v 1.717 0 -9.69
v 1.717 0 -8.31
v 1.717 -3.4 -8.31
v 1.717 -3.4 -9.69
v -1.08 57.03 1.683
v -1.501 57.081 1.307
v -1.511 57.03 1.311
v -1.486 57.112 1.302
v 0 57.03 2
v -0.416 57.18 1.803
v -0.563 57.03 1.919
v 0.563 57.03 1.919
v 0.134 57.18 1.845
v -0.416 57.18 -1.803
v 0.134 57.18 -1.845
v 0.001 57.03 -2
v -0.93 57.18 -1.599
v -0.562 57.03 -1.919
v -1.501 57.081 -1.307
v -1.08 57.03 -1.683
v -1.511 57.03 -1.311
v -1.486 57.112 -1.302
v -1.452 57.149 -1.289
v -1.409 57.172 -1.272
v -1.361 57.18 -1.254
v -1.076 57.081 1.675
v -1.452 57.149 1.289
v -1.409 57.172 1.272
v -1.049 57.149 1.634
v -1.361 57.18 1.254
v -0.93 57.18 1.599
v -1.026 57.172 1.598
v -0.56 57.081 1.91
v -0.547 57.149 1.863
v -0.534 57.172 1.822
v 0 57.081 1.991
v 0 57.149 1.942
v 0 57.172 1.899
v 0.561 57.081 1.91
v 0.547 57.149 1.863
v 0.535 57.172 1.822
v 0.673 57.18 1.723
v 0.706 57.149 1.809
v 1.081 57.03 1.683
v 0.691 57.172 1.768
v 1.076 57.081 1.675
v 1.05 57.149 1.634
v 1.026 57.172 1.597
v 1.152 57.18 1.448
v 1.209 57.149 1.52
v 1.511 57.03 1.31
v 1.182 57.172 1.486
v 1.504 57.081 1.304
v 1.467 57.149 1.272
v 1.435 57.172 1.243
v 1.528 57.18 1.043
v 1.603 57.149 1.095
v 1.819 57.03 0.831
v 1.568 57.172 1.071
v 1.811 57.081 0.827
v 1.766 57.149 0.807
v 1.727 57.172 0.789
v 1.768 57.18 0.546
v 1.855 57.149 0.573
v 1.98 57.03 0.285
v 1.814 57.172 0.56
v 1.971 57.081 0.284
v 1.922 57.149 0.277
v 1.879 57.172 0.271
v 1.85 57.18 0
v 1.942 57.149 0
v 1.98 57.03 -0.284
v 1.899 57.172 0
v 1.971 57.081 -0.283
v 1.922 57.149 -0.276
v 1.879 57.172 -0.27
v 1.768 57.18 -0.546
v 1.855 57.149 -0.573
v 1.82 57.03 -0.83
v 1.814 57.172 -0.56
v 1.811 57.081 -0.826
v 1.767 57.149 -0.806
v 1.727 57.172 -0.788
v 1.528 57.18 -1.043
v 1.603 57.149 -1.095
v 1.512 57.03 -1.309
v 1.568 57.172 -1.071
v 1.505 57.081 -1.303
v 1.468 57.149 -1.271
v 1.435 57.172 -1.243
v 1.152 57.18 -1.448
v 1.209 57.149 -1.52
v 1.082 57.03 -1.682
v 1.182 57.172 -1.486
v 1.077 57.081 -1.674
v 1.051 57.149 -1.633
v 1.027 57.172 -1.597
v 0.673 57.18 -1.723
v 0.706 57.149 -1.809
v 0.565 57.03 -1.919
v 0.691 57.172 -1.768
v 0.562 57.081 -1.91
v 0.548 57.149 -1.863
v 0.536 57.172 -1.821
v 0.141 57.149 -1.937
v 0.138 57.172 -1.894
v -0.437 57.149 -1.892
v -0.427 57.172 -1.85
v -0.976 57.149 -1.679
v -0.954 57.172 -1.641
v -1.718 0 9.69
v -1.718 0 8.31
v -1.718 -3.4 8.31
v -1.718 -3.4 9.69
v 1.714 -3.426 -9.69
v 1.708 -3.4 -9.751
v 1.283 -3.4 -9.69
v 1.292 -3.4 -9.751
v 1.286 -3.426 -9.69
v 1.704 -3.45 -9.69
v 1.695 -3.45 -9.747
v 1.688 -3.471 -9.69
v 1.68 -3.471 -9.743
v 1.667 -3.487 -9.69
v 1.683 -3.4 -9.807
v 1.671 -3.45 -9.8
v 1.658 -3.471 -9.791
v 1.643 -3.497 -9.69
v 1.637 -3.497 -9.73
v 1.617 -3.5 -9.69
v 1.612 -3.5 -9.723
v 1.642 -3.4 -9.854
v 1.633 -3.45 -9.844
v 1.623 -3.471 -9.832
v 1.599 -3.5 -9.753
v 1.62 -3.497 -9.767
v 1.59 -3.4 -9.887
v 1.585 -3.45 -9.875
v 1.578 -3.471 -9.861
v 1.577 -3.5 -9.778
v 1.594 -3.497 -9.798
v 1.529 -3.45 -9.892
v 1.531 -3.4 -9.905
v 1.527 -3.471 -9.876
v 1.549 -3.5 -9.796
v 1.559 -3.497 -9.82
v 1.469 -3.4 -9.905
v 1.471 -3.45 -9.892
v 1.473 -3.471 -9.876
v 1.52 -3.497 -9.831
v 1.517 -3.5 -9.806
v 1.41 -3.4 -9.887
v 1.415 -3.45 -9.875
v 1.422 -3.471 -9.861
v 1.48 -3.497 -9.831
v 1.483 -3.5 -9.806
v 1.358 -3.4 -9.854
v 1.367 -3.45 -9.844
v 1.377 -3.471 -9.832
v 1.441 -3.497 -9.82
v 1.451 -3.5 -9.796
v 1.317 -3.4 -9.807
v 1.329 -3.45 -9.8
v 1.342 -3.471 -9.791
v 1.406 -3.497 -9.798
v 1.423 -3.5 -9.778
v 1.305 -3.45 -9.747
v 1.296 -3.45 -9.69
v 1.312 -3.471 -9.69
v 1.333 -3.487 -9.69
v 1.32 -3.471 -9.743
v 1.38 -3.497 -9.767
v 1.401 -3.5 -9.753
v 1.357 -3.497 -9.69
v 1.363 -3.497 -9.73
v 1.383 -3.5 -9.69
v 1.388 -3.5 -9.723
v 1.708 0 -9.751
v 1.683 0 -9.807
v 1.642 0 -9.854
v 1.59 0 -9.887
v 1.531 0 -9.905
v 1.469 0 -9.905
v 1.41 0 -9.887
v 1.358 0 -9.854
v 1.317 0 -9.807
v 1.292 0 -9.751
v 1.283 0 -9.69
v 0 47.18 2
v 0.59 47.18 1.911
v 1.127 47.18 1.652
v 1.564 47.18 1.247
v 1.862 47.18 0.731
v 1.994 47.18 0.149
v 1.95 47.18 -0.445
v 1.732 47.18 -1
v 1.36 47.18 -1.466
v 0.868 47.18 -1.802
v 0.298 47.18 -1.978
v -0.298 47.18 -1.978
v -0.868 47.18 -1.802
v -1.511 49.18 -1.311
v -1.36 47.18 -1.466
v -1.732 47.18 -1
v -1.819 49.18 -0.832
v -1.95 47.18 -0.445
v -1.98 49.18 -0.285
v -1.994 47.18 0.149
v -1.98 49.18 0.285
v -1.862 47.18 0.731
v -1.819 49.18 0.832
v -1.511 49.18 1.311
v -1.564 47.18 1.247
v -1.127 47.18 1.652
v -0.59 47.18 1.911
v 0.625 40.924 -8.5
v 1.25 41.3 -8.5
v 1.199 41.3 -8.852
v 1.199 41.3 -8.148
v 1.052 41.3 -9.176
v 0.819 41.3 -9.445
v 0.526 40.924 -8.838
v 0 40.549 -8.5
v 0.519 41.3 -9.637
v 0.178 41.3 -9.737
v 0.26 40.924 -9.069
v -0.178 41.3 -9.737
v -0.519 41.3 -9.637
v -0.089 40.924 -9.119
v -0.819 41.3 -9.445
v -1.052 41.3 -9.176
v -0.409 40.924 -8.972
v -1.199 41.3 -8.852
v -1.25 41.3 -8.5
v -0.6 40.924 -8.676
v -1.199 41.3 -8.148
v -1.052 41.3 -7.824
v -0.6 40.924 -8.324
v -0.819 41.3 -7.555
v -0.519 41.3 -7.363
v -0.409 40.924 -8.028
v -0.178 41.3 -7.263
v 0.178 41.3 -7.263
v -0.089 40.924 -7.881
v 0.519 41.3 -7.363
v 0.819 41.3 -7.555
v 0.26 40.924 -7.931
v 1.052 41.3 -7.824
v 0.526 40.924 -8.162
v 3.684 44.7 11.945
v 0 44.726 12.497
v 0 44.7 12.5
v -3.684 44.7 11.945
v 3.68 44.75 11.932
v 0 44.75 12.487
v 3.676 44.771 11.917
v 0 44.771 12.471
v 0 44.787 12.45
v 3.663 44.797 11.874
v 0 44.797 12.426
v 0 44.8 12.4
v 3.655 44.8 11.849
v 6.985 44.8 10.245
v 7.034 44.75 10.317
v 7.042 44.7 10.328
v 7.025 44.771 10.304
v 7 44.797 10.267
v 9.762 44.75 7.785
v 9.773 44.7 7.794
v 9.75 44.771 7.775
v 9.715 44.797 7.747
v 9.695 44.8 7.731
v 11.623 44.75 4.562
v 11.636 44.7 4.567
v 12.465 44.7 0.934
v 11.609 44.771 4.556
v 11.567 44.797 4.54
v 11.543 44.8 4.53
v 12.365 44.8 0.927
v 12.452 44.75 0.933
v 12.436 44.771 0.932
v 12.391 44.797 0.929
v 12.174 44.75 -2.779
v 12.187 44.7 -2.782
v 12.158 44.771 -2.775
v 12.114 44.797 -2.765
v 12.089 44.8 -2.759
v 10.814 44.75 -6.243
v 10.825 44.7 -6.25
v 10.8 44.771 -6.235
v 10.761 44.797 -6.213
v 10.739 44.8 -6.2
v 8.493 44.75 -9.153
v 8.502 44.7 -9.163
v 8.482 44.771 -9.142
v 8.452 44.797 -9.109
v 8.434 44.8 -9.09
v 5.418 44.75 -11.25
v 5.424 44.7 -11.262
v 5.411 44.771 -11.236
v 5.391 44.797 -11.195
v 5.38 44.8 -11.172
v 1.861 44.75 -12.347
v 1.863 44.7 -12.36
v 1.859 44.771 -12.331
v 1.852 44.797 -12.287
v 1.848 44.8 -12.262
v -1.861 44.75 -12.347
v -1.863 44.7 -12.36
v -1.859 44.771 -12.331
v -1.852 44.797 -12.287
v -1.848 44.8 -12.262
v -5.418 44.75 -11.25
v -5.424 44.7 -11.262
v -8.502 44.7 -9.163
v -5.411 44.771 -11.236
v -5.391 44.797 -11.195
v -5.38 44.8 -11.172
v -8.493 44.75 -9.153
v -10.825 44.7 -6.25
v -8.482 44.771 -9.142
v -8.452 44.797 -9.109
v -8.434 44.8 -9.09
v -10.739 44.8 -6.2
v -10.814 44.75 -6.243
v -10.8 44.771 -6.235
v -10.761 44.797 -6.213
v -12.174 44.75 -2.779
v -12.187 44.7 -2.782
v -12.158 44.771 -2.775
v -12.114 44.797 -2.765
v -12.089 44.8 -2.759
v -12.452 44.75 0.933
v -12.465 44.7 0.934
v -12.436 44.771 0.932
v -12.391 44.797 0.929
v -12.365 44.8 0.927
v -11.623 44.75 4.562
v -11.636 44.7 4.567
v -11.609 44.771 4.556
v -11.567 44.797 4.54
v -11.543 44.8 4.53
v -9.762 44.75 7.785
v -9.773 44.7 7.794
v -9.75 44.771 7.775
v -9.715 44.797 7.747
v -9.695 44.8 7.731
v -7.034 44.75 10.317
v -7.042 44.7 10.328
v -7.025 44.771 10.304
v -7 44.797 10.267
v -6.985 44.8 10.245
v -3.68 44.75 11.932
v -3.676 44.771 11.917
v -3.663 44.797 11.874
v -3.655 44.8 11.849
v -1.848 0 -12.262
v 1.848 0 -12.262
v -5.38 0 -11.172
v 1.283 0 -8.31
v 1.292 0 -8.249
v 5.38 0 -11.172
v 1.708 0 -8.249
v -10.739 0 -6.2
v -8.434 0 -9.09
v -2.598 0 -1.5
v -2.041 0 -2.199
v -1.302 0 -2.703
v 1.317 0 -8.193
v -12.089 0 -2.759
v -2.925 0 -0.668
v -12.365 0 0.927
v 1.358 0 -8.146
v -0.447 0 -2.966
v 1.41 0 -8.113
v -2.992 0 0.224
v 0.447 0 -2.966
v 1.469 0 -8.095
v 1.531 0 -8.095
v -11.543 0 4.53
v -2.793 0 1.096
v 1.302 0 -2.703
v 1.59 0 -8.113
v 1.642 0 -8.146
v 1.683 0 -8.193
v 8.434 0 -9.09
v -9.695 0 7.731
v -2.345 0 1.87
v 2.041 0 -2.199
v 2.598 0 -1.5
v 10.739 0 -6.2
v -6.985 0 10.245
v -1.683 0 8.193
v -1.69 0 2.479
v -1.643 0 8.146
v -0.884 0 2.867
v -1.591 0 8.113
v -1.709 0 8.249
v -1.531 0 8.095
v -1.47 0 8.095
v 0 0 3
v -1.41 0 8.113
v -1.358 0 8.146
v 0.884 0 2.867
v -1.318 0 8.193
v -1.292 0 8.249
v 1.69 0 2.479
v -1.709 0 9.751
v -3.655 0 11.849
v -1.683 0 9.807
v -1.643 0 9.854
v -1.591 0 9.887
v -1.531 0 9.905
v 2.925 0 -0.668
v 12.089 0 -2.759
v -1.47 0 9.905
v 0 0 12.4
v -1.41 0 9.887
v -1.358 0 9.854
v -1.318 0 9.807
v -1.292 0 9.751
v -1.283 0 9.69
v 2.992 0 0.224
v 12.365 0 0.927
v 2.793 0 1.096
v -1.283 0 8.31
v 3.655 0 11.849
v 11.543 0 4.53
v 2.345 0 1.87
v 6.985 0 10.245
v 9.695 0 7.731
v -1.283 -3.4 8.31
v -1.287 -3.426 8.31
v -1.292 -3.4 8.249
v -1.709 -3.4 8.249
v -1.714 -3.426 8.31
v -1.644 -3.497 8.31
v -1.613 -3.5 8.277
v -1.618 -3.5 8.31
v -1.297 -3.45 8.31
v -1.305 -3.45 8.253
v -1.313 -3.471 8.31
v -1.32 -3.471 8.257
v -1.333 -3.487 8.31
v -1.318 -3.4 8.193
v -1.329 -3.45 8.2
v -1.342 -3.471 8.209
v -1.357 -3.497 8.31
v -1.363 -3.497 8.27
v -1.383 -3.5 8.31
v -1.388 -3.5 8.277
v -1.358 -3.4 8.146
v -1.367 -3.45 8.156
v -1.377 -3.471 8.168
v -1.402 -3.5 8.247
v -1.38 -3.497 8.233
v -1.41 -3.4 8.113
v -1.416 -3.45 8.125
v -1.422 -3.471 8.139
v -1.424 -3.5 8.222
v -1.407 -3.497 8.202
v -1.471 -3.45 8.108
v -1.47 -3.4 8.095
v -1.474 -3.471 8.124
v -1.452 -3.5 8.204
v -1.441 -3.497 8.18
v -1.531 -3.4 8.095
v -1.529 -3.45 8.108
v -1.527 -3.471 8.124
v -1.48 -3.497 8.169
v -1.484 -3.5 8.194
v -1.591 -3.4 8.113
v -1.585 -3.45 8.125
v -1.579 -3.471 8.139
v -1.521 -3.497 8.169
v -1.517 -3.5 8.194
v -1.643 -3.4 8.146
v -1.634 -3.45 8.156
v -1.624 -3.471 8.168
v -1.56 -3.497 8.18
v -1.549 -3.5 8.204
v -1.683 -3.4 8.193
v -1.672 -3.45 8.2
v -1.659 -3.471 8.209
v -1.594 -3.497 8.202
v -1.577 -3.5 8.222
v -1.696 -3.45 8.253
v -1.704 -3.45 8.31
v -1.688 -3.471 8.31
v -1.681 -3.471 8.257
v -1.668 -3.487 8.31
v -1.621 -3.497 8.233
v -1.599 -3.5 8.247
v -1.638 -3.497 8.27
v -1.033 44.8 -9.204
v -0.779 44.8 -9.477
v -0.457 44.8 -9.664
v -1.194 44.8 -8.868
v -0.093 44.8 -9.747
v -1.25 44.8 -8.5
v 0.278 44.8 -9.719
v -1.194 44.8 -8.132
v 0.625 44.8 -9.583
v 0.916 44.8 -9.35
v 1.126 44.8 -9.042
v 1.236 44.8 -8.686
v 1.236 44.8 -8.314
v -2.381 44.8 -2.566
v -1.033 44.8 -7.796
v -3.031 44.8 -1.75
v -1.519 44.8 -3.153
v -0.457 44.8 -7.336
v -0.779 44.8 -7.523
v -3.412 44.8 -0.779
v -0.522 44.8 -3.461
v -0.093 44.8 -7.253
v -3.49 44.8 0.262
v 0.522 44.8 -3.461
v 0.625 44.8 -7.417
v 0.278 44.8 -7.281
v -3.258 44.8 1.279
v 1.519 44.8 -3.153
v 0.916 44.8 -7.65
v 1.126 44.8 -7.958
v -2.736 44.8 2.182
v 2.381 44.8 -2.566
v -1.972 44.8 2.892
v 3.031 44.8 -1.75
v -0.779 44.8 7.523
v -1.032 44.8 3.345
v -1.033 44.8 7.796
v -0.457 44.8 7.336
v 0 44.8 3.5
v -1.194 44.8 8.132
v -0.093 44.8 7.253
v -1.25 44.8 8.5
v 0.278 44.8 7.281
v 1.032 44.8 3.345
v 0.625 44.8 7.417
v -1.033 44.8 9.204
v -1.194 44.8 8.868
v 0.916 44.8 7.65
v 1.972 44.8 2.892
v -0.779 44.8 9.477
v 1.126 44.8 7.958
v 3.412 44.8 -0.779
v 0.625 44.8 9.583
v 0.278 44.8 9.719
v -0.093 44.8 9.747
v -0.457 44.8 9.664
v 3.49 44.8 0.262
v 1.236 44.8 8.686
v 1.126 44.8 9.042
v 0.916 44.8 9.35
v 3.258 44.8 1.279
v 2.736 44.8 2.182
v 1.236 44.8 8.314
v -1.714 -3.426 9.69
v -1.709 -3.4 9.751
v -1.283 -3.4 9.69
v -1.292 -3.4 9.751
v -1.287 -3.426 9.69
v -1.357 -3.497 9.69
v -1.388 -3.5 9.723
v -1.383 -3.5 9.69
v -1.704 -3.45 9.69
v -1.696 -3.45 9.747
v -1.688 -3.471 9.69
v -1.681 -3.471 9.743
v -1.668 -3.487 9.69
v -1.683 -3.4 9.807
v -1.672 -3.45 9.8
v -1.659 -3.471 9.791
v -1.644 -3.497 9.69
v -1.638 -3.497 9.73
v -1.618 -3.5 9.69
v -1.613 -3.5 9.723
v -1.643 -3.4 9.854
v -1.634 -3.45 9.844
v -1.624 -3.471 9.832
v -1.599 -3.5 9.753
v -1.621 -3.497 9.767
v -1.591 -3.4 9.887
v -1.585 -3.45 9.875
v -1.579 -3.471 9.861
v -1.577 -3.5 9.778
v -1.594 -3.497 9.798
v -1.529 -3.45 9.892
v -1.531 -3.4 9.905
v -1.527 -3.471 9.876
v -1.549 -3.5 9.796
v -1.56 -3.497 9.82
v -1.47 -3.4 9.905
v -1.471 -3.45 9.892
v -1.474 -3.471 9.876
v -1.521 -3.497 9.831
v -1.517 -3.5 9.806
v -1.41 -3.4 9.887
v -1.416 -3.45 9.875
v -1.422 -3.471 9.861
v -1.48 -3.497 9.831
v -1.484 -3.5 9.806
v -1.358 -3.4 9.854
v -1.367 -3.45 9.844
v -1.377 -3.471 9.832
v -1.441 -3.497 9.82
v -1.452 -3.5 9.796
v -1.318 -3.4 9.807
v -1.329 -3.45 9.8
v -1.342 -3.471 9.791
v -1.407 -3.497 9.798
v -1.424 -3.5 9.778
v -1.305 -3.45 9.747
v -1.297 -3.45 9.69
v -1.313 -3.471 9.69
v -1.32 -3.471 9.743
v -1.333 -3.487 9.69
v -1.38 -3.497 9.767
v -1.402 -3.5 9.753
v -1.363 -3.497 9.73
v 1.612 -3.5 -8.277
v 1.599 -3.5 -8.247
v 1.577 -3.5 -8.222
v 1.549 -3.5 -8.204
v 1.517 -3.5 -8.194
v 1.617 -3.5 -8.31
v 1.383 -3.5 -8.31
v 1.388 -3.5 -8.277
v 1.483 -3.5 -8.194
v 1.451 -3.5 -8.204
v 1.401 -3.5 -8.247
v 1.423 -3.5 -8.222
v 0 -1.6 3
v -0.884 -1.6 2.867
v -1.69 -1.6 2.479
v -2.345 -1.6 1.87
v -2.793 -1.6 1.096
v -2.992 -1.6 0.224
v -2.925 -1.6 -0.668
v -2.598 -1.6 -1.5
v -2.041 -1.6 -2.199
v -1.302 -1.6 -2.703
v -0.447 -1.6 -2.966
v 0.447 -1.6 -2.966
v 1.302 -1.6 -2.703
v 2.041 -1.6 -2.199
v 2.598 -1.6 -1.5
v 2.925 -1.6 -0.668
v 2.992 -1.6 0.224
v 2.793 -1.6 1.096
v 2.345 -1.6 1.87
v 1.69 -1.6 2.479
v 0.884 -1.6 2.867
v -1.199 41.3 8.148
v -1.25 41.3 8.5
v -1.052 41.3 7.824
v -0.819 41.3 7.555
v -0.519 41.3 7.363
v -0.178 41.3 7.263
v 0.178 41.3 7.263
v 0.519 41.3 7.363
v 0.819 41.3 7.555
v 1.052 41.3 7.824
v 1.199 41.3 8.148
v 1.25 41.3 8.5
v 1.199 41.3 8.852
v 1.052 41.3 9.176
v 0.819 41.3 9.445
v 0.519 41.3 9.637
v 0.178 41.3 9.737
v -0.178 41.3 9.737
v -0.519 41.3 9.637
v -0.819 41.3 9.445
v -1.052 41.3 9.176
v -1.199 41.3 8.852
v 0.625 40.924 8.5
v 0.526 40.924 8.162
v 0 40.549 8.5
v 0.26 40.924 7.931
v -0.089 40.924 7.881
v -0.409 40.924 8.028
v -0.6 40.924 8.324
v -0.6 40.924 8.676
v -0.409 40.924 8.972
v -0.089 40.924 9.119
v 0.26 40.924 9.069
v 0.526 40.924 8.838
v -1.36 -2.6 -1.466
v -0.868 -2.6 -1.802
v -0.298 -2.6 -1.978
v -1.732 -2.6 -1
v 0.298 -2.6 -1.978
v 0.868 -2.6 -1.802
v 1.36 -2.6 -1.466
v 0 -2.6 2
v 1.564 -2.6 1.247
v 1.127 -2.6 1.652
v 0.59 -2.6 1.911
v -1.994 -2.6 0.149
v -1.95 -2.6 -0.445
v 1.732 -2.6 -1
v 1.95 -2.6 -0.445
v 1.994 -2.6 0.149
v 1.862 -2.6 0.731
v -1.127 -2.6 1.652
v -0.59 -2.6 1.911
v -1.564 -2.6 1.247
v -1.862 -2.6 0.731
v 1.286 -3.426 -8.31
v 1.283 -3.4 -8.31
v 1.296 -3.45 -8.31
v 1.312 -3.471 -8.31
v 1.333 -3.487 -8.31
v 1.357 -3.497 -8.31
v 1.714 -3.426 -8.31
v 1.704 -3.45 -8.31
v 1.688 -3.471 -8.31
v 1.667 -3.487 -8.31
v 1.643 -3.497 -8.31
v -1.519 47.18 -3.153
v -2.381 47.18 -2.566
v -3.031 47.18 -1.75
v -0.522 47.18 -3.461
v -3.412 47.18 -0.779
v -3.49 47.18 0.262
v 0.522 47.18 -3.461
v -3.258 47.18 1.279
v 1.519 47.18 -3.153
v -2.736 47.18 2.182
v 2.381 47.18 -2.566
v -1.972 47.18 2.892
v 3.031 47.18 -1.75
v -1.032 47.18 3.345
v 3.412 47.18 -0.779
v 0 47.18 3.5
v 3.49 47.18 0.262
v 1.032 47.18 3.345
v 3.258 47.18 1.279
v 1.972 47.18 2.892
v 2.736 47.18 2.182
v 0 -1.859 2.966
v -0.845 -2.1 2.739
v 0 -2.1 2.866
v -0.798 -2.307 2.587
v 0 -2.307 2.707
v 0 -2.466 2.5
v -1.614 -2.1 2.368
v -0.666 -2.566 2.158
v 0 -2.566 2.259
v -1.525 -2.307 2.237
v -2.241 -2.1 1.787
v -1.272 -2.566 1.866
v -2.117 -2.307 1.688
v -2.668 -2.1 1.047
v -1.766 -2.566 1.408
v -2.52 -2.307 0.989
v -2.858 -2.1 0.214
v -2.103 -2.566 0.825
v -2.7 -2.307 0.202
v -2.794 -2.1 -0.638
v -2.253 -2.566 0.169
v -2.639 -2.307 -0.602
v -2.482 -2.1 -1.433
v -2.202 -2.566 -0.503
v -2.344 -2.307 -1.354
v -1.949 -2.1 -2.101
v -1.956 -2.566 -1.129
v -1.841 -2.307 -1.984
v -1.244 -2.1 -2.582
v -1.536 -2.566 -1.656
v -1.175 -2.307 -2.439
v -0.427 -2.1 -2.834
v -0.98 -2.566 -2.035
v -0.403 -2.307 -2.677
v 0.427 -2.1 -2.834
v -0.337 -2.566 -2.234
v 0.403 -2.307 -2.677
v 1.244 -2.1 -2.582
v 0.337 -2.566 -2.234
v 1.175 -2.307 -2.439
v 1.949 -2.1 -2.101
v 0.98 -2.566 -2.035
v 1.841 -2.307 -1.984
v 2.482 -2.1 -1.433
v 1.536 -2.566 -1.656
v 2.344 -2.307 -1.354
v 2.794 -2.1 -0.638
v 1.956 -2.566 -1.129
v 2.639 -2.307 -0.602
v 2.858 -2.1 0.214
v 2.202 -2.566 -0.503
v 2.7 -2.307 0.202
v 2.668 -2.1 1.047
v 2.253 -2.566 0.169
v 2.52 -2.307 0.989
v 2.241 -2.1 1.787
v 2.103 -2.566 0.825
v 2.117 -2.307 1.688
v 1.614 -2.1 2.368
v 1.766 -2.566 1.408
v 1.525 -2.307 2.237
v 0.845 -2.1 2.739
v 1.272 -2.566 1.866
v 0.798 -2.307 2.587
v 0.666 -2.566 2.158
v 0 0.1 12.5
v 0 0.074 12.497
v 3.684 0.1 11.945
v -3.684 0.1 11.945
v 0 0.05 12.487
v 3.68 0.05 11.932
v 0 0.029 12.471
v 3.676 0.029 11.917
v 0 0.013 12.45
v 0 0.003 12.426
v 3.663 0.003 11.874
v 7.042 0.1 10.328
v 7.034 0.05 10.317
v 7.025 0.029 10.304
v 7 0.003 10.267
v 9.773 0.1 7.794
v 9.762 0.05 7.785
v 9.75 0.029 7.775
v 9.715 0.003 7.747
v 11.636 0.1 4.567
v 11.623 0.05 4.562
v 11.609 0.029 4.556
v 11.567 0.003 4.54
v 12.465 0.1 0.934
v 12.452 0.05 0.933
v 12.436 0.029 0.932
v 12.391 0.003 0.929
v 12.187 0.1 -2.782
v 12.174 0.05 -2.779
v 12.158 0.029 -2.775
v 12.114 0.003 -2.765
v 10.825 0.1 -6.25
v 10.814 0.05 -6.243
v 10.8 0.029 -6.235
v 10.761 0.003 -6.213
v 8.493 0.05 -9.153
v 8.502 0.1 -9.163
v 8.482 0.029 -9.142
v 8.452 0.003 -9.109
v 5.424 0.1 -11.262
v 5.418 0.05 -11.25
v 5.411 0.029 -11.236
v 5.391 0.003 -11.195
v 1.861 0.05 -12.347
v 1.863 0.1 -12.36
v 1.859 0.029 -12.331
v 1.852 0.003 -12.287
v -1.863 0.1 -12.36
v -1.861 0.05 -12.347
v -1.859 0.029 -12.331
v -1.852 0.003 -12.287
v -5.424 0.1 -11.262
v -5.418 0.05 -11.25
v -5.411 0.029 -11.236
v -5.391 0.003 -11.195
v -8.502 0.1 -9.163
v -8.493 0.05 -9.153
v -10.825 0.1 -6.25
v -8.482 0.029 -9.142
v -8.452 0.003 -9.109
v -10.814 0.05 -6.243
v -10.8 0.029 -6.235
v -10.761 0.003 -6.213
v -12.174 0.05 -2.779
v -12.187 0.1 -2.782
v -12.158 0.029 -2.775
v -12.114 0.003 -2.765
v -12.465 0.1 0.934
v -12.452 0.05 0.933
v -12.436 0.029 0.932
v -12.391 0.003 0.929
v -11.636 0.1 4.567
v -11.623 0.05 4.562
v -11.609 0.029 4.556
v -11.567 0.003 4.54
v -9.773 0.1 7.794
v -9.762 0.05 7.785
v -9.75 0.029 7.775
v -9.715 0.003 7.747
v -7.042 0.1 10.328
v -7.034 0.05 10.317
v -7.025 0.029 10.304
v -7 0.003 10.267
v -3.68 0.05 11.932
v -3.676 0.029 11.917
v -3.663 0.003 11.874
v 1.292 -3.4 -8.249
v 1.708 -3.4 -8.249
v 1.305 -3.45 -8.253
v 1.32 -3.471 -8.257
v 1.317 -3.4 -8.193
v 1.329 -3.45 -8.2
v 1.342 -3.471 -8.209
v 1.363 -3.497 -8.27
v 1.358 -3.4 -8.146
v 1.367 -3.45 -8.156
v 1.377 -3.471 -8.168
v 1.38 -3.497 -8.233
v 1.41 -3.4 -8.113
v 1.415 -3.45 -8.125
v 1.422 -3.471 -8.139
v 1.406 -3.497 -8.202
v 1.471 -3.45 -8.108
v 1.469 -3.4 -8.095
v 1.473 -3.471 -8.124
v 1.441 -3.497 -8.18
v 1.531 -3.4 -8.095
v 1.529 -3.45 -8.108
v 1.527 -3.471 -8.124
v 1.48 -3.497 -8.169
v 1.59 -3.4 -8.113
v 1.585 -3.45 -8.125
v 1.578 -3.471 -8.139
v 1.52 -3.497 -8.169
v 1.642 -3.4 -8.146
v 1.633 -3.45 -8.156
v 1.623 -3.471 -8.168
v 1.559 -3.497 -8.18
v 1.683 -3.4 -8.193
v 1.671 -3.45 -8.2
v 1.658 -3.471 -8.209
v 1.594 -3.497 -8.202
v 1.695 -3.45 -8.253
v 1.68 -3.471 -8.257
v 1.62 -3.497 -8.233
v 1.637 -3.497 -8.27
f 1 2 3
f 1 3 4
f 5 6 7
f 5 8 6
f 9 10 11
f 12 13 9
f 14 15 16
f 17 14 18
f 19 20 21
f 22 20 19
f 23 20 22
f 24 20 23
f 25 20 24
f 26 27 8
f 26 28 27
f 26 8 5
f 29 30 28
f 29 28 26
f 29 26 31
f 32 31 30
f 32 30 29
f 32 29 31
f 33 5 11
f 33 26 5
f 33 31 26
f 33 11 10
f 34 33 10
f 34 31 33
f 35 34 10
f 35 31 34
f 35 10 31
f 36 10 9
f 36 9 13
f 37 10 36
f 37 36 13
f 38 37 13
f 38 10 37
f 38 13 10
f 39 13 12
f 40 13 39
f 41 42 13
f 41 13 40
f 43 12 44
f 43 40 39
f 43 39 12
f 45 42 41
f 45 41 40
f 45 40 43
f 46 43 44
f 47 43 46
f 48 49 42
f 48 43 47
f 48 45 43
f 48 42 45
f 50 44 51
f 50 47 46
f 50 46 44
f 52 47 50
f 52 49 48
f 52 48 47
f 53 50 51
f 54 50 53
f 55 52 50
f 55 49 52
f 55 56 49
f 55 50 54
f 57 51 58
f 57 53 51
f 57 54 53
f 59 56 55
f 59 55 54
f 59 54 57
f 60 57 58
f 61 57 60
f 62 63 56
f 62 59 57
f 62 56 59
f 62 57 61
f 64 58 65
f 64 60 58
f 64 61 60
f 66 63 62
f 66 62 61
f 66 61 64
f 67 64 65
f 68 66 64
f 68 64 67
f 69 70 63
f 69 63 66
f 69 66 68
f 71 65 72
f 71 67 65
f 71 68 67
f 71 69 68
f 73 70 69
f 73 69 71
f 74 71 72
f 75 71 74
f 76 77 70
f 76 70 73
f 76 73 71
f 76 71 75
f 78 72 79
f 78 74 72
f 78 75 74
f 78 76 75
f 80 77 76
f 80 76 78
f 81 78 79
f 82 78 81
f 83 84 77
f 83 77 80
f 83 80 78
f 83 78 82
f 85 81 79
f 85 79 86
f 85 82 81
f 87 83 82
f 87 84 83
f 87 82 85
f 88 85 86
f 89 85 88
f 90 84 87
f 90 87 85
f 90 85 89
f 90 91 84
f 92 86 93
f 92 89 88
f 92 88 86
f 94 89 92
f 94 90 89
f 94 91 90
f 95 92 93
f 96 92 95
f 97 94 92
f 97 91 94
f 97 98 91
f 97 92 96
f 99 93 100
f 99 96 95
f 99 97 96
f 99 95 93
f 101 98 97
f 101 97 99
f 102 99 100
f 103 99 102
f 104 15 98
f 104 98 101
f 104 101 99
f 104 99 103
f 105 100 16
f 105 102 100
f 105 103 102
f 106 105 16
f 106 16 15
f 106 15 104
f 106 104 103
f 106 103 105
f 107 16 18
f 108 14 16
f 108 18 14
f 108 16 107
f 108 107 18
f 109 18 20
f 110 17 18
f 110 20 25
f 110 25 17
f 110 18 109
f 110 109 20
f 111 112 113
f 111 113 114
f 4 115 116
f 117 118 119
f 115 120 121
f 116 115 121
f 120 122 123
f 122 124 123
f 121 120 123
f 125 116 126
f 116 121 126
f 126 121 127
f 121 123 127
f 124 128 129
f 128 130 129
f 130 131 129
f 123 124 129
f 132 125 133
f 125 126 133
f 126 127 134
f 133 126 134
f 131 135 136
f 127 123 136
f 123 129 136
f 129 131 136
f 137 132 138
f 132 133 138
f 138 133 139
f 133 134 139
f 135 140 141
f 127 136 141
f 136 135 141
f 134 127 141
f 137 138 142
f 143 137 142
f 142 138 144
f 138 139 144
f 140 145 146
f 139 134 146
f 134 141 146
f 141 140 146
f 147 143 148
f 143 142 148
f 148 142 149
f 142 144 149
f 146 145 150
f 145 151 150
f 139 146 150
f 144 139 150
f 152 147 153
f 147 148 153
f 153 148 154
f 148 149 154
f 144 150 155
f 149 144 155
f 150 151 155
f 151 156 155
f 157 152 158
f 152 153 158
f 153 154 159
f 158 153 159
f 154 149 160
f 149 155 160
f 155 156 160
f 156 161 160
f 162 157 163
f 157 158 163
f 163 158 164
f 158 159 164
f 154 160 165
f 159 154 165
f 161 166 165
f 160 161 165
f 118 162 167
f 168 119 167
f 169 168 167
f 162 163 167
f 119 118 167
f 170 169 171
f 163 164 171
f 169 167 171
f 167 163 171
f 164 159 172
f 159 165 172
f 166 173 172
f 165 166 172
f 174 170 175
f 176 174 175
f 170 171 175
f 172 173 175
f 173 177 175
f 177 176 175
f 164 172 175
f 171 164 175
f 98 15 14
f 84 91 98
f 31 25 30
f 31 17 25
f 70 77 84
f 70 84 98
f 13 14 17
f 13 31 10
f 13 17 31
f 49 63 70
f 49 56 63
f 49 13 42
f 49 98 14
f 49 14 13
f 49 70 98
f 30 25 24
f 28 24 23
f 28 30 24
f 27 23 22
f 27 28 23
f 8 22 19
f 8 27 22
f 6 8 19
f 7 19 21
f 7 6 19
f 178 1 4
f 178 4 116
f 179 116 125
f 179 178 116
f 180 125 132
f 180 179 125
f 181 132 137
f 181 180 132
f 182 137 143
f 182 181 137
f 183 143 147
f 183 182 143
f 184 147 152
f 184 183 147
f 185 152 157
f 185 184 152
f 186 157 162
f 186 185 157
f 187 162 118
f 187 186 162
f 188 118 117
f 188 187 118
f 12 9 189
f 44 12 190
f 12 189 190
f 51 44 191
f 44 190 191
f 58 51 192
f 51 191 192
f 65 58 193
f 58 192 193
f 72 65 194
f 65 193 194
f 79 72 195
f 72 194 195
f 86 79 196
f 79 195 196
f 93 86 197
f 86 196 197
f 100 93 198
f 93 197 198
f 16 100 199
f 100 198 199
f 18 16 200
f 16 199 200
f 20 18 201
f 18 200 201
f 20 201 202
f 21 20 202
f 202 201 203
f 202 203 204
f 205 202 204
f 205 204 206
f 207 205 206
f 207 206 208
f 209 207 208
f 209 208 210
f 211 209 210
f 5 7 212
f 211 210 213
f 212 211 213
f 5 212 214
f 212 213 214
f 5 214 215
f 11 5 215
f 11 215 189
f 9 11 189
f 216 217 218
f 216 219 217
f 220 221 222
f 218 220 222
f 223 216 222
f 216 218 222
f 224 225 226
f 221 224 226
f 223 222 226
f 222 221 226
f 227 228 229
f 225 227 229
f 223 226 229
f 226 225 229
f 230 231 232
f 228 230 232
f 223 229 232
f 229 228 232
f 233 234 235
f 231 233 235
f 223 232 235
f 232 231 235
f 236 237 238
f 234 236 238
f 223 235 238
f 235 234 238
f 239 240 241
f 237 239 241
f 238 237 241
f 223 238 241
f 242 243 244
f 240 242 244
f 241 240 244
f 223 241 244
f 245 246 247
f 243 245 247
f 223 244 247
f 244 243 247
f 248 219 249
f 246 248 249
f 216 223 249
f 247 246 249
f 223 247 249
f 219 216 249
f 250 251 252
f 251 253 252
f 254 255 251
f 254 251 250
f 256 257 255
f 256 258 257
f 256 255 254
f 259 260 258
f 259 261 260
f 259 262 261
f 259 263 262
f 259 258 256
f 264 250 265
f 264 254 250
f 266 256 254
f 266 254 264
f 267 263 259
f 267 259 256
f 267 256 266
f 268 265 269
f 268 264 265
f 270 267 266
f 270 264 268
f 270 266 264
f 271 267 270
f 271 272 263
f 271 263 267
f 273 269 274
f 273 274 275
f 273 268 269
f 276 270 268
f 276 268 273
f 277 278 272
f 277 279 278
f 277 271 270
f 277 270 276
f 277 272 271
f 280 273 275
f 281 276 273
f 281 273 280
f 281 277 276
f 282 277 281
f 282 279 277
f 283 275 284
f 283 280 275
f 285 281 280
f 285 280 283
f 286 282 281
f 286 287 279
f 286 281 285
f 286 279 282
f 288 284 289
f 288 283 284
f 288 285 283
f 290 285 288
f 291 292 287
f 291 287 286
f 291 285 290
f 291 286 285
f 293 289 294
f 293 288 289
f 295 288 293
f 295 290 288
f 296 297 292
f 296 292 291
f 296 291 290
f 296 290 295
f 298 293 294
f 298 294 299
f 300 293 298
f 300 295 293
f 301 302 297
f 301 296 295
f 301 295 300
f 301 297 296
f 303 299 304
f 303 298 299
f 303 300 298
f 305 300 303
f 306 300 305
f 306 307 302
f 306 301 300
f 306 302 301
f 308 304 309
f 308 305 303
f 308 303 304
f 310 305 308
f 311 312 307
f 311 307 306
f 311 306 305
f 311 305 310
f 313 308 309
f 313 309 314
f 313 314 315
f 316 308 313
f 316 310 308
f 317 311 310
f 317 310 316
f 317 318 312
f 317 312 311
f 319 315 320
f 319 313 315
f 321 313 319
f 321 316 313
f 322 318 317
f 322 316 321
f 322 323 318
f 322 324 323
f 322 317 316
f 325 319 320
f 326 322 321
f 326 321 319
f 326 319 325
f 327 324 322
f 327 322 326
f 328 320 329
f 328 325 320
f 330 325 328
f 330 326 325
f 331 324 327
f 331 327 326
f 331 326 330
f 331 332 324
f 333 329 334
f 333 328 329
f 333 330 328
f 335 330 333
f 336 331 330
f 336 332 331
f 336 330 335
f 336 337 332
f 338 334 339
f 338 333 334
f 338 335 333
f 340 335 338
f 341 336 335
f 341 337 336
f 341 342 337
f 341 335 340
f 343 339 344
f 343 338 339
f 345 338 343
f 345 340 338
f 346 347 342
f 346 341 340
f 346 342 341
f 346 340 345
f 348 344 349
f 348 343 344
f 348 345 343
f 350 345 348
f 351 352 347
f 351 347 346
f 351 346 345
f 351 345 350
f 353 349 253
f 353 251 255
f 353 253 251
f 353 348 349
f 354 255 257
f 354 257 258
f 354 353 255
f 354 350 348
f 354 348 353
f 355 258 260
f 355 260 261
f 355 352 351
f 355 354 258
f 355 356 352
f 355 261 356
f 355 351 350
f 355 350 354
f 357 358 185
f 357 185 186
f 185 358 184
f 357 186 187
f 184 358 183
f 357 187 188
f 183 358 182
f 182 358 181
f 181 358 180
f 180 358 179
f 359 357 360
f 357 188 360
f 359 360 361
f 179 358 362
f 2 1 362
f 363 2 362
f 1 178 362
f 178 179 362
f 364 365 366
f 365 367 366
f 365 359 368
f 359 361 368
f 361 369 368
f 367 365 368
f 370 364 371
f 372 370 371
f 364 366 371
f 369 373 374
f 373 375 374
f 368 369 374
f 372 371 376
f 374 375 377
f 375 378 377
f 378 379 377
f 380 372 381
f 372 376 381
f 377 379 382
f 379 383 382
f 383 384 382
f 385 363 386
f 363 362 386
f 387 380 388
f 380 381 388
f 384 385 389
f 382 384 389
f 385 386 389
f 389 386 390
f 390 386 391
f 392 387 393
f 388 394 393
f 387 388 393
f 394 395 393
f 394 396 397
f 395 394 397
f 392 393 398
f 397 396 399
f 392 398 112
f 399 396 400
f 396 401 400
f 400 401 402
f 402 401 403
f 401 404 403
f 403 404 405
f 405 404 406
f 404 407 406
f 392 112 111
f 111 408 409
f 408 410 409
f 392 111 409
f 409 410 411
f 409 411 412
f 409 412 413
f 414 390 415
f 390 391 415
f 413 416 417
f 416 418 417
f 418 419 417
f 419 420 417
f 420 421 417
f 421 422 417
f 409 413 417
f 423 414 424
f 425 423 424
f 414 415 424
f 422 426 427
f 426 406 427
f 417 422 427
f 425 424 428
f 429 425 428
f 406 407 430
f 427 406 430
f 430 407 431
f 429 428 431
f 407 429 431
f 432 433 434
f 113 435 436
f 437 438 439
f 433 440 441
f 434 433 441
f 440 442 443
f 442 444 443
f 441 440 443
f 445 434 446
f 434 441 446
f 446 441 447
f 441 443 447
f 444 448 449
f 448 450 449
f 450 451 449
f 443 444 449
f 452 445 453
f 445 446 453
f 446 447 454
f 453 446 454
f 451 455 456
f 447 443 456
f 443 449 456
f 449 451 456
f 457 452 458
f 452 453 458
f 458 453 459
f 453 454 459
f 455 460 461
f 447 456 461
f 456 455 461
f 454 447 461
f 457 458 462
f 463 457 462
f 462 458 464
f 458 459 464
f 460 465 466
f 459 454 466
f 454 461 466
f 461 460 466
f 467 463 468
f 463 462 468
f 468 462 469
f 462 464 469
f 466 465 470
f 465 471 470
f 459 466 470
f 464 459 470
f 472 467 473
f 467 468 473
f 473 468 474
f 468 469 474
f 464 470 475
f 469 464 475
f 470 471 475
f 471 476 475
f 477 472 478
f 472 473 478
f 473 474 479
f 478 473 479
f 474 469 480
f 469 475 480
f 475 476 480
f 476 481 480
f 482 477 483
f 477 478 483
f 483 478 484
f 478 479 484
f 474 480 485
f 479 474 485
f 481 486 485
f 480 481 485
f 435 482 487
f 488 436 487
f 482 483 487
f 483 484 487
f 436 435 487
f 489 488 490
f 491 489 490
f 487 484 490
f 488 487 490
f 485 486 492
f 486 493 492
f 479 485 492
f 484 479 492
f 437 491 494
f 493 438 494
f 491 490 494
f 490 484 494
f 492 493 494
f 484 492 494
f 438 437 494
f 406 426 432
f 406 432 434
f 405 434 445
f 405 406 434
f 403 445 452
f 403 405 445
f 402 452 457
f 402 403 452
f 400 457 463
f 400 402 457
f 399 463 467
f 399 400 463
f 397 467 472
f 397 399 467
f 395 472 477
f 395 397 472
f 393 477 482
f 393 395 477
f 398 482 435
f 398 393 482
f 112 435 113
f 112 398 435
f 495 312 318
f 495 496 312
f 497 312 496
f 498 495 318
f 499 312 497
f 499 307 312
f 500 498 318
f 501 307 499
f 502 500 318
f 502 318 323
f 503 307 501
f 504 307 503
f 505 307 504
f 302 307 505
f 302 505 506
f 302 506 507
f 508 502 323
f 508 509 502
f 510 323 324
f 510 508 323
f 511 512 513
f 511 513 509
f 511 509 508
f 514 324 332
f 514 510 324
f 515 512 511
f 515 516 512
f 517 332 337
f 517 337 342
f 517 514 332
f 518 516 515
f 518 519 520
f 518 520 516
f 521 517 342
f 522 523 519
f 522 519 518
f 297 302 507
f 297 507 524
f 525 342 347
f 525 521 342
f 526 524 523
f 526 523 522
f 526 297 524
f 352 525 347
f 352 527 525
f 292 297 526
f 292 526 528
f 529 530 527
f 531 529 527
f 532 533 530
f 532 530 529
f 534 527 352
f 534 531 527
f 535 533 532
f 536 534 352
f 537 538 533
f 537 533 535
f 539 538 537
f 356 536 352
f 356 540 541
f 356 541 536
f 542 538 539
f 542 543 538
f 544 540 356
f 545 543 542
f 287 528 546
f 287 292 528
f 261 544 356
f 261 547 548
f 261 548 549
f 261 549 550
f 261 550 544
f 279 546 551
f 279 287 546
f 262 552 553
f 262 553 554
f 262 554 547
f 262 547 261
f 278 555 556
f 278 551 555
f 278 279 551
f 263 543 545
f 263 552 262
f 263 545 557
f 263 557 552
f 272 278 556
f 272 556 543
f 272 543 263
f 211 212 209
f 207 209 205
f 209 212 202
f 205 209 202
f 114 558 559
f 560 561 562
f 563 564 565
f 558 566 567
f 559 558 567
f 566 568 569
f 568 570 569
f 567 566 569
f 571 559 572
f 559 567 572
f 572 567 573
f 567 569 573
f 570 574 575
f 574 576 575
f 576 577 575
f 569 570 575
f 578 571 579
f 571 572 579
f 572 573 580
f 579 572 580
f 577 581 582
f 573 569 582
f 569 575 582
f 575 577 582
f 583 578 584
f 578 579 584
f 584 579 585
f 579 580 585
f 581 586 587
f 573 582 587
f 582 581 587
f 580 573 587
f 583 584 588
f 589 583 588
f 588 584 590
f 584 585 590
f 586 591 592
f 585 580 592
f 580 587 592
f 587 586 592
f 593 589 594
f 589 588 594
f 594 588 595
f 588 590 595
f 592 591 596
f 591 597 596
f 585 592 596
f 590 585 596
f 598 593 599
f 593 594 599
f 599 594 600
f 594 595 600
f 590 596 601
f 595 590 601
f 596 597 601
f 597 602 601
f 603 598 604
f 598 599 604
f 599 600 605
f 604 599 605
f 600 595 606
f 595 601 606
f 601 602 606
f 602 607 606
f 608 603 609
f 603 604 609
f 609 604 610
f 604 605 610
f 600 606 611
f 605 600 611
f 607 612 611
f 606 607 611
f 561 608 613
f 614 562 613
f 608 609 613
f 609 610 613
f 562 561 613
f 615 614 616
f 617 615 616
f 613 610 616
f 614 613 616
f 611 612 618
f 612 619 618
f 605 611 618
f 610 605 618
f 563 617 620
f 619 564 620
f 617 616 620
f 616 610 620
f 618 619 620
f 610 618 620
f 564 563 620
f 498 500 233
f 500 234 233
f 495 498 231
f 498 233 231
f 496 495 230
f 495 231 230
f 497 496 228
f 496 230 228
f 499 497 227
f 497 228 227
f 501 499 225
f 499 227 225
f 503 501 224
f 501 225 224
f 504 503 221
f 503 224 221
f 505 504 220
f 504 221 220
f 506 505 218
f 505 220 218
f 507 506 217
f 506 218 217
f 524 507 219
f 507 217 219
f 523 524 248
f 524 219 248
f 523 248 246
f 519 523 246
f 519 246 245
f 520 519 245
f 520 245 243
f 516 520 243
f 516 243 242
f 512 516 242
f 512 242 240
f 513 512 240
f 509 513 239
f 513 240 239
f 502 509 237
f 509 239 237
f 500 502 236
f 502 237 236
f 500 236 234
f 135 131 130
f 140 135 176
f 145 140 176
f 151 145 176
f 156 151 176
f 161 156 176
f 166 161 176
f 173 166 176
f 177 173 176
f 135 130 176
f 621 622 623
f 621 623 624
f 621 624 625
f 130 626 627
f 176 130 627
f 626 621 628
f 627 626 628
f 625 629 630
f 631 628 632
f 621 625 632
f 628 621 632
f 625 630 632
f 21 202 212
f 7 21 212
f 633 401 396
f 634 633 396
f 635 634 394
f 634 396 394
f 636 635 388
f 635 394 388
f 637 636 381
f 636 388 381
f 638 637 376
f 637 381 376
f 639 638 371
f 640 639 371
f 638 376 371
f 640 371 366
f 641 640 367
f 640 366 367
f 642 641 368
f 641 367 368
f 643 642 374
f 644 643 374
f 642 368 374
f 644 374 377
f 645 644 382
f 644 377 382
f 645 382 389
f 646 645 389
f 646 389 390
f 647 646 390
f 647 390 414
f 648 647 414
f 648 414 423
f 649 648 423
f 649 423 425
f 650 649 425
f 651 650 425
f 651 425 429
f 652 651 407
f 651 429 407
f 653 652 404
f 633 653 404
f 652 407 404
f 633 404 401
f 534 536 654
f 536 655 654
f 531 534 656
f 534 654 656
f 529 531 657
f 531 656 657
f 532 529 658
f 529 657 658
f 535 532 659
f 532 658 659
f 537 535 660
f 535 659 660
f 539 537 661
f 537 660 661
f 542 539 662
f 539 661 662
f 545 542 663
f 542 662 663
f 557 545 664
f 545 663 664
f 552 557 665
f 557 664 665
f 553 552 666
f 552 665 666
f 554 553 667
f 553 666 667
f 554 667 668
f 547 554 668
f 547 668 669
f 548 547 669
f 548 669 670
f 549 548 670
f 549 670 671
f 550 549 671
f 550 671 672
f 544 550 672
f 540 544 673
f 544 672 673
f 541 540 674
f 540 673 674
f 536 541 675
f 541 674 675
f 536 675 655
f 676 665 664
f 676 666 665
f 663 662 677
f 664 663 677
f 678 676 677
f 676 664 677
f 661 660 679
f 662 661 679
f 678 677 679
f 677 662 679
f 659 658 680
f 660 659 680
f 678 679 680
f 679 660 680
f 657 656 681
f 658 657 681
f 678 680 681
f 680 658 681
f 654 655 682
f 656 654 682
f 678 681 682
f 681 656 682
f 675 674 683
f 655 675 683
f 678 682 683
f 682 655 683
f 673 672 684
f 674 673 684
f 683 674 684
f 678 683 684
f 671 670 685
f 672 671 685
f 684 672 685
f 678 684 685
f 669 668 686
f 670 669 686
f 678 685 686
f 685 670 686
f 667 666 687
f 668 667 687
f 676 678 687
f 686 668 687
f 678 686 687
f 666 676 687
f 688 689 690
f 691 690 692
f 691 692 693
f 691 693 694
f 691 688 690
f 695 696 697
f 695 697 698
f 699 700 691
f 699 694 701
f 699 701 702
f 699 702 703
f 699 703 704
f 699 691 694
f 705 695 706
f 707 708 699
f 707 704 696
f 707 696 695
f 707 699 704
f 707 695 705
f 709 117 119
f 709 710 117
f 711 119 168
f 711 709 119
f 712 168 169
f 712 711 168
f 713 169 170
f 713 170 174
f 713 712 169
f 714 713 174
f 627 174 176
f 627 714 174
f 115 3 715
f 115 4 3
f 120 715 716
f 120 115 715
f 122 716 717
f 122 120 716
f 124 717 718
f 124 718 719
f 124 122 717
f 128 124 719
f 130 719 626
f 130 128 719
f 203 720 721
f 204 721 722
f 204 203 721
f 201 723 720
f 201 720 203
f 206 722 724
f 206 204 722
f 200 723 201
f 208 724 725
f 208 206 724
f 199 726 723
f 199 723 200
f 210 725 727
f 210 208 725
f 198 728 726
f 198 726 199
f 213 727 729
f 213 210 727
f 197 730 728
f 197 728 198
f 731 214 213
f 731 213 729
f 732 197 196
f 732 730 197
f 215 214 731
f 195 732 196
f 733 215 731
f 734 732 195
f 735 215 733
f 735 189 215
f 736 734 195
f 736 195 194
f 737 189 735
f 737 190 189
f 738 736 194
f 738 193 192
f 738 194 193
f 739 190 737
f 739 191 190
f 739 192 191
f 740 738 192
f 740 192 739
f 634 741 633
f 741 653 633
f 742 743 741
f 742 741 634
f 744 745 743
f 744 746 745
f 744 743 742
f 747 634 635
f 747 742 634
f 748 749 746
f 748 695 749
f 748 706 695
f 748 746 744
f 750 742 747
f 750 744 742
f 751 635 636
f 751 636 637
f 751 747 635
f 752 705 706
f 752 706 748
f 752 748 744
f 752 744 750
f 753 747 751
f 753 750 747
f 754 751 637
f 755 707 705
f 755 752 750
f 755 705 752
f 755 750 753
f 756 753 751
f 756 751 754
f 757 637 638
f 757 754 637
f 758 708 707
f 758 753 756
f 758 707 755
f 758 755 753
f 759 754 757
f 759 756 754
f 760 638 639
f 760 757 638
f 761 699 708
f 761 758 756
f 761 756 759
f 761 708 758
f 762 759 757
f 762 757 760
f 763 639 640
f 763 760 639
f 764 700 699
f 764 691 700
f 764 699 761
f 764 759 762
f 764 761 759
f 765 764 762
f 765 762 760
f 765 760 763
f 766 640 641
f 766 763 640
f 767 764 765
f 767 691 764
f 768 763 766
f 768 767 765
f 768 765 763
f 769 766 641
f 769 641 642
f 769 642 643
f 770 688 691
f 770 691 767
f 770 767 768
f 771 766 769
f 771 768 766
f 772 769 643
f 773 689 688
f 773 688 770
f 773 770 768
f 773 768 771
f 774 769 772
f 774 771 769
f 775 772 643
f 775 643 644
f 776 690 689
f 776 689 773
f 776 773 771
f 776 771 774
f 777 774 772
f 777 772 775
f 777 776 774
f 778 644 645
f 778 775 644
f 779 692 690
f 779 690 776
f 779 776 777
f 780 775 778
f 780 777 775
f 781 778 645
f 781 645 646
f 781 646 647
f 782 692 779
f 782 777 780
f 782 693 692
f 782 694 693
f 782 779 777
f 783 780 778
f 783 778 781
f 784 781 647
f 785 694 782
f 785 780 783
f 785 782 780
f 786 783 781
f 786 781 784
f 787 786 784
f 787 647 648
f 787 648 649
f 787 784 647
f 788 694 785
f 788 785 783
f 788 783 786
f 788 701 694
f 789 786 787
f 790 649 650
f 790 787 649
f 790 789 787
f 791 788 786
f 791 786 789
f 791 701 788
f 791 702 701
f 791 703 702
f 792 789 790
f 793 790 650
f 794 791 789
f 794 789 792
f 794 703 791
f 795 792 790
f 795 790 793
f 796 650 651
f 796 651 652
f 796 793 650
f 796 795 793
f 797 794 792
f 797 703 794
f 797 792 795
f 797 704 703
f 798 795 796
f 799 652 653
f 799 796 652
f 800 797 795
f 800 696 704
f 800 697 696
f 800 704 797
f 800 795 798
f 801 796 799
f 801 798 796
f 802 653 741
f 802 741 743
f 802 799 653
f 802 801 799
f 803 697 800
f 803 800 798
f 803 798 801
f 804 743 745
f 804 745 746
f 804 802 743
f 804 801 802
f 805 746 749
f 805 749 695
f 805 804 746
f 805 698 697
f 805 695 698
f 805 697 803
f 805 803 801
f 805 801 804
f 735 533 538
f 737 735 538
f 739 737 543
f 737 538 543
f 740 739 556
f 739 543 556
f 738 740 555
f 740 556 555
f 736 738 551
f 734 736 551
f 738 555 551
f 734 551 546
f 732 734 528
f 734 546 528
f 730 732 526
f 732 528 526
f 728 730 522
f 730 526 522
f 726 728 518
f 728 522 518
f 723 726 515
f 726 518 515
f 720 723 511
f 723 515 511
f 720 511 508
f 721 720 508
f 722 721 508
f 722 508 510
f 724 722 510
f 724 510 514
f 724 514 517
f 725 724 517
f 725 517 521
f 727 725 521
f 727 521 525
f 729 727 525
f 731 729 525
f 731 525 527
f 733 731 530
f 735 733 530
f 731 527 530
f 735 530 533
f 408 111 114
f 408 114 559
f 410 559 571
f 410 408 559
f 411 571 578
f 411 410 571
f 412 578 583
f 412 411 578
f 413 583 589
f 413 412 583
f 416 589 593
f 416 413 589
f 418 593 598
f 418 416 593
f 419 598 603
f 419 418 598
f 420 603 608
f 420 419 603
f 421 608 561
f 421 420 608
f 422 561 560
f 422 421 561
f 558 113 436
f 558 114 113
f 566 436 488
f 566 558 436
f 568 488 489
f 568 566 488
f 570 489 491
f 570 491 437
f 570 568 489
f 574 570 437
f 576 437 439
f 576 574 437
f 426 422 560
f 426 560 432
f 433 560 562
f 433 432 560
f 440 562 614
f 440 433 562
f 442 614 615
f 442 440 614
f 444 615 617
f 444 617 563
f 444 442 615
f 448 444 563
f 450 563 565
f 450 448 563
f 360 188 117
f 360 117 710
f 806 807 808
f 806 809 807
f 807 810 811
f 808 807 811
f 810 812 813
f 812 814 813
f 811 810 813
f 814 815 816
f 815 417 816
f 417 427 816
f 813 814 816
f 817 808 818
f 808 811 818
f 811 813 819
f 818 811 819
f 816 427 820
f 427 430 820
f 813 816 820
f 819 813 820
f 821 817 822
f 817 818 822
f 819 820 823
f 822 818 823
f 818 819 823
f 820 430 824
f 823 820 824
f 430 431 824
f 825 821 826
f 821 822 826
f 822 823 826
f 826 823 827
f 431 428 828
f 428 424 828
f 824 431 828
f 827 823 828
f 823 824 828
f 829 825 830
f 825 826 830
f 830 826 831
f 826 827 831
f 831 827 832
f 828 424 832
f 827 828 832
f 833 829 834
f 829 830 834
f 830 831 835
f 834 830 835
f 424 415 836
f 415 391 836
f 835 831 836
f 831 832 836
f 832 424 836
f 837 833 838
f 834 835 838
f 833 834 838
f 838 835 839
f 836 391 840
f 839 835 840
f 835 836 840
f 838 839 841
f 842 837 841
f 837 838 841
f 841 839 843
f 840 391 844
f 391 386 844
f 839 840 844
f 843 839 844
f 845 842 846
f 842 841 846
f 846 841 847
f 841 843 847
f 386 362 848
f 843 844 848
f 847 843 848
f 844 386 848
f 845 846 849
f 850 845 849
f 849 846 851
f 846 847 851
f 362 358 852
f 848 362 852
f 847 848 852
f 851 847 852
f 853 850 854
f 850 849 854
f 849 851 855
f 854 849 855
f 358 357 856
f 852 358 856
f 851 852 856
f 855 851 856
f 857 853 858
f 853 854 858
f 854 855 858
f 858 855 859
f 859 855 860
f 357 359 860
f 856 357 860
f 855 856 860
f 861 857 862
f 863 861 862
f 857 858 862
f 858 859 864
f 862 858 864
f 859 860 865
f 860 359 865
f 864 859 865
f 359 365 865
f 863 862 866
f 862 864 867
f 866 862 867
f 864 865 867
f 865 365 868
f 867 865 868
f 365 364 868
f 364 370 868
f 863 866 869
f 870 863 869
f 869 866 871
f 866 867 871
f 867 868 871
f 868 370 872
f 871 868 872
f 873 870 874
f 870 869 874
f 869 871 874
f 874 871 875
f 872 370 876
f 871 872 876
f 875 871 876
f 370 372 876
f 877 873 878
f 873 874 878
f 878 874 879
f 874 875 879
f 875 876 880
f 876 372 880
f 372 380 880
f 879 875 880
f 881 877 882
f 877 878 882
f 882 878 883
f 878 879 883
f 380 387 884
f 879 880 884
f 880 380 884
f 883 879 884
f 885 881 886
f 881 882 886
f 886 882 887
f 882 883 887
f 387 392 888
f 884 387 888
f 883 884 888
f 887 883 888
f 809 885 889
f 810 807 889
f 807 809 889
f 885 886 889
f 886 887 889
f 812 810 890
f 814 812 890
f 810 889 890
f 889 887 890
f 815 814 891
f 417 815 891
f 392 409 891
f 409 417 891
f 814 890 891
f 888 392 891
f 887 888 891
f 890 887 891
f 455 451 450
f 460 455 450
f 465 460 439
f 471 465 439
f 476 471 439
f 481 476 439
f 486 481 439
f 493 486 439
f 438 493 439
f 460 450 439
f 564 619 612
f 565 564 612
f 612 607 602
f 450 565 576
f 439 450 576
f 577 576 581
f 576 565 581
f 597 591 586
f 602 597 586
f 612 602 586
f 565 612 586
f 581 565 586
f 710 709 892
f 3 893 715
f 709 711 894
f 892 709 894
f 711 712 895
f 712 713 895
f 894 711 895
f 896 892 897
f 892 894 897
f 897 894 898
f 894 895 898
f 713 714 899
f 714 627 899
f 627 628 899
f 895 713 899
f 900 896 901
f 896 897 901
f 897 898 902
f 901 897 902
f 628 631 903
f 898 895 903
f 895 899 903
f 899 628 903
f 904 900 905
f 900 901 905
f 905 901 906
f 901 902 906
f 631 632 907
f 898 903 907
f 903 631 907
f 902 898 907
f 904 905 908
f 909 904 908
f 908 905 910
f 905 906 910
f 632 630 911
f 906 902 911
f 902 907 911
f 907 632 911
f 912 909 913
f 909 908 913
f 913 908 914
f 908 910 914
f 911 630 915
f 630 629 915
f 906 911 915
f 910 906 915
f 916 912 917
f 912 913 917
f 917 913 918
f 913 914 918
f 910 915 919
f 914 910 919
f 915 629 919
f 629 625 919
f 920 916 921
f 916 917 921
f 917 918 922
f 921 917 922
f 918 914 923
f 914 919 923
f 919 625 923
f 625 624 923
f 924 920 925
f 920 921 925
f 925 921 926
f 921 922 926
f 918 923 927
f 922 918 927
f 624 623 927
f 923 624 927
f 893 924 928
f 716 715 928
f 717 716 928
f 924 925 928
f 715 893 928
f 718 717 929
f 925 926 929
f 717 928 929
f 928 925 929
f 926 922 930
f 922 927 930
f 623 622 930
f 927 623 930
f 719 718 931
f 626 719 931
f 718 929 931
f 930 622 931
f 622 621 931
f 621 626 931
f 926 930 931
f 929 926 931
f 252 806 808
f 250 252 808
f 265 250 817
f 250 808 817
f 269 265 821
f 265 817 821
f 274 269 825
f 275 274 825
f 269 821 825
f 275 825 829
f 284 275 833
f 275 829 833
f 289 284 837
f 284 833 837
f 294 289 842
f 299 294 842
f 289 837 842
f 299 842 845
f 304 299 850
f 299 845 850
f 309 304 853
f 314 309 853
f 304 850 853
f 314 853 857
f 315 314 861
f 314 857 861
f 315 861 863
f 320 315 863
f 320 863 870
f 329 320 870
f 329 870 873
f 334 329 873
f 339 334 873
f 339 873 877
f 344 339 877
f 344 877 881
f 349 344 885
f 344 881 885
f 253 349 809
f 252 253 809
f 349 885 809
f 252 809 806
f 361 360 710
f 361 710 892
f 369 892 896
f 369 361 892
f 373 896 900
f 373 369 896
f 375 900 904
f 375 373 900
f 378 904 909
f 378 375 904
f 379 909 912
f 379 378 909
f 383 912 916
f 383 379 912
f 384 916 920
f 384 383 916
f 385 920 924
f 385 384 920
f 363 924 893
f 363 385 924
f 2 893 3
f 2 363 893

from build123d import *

# Parameters (mm, degrees)
ESBO_O2_R                 = 12.5
RESSALTO_EXTRUS_O2_DEPTH  = 44.8
RESSALTO_EXTRUS_O7_DEPTH  = 3.5
FILETE9_R                 = 0.1
ESBO_O7_5_R               = 3
RESSALTO_EXTRUS_O8_DEPTH  = 2.6
FILETE10_R                = 1
FURO_ROSCADO_DE_M31_D     = 2.5
FURO_ROSCADO_DE_M31_DEPTH = 3.5
FURO_ROSCADO_DE_M31_TIP   = 0.751075774
ESBO_O11_2_R              = 3.5
ESBO_O11_2_R_2            = 2
RESSALTO_EXTRUS_O9_DEPTH  = 2.38
ESBO_O11_4_R              = 2
RESSALTO_EXTRUS_O10_DEPTH = 12.38
CORTE_EXTRUS_O1_START     = -8
CORTE_EXTRUS_O1_DEPTH     = 8
FILETE11_R                = 0.15


with BuildPart() as part:
    # Esboço2 → Ressalto-extrusão2 (new body)
    with BuildSketch(Plane(origin=(0, 0, 0), x_dir=(1, 0, 0), z_dir=(0, 1, 0))):
        with Locations(Location((0, 0, 0), (0, 0, 270))):
            Circle(ESBO_O2_R)
    extrude(amount=RESSALTO_EXTRUS_O2_DEPTH)

    # Esboço7 → Ressalto-extrusão7 (add)
    with BuildSketch(Plane.XZ):
        with BuildLine():
            Line((-1.283346754, 9.689860485), (-1.283346754, 8.310139515))
            ThreePointArc((-1.283346754, 8.310139515), (-1.500488621, 8.092997649), (-1.717630487, 8.310139515))
            Line((-1.717630487, 8.310139515), (-1.717630487, 9.689860485))
            ThreePointArc((-1.717630487, 9.689860485), (-1.500488621, 9.907002351), (-1.283346754, 9.689860485))
        make_face()
        with BuildLine():
            Line((1.717141867, -8.310139515), (1.717141867, -9.689860485))
            ThreePointArc((1.717141867, -9.689860485), (1.5, -9.907002351), (1.282858133, -9.689860485))
            Line((1.282858133, -9.689860485), (1.282858133, -8.310139515))
            ThreePointArc((1.282858133, -8.310139515), (1.5, -8.092997649), (1.717141867, -8.310139515))
        make_face()
    extrude(amount=RESSALTO_EXTRUS_O7_DEPTH)

    # Filete9
    filete9_edges = [part.edges().sort_by_distance(p)[0] for p in [
        (1.717141867, -3.5, -9),
        (1.5, -3.5, -8.092997649),
        (1.282858133, -3.5, -9),
        (1.5, -3.5, -9.907002351),
        (-1.283346754, -3.5, 9),
        (-1.500488621, -3.5, 9.907002351),
        (-1.717630487, -3.5, 9),
        (-1.500488621, -3.5, 8.092997649),
        (0, 0, -12.5),
        (0, 44.8, -12.5),
    ]]
    fillet(filete9_edges, radius=FILETE9_R)

    # Esboço7<5> → Ressalto-extrusão8 (add)
    with BuildSketch(Plane.XZ):
        with Locations(Location((0, 0, 0), (0, 0, 90))):
            Circle(ESBO_O7_5_R)
    extrude(amount=RESSALTO_EXTRUS_O8_DEPTH)

    # Filete10
    filete10_edges = [part.edges().sort_by_distance(p)[0] for p in [
        (0, -2.6, -3),
    ]]
    fillet(filete10_edges, radius=FILETE10_R)

    # Furo roscado de M31
    with Locations(Plane(origin=(0, 44.8, 0), x_dir=(1, 0, 0), z_dir=(0, 1, 0))):
        with Locations((0, -8.5), (0, 8.5)):
            Hole(FURO_ROSCADO_DE_M31_D / 2, depth=FURO_ROSCADO_DE_M31_DEPTH)
            with Locations((0, 0, -(FURO_ROSCADO_DE_M31_DEPTH + FURO_ROSCADO_DE_M31_TIP / 2))):  # 118° drill point
                Cone(0, FURO_ROSCADO_DE_M31_D / 2, FURO_ROSCADO_DE_M31_TIP, mode=Mode.SUBTRACT)

    # Esboço11<2> → Ressalto-extrusão9 (add)
    with BuildSketch(Plane(origin=(0, 44.8, 0), x_dir=(1, 0, 0), z_dir=(0, 1, 0))):
        with Locations(Location((0, 0, 0), (0, 0, 270))):
            Circle(ESBO_O11_2_R)
        with Locations(Location((0, 0, 0), (0, 0, 270))):
            Circle(ESBO_O11_2_R_2, mode=Mode.SUBTRACT)
    extrude(amount=RESSALTO_EXTRUS_O9_DEPTH)

    # Esboço11<4> → Ressalto-extrusão10 (add)
    with BuildSketch(Plane(origin=(0, 44.8, 0), x_dir=(1, 0, 0), z_dir=(0, 1, 0))):
        with Locations(Location((0, 0, 0), (0, 0, 270))):
            Circle(ESBO_O11_4_R)
    extrude(amount=RESSALTO_EXTRUS_O10_DEPTH)

    # Esboço13 → Corte-extrusão1 (cut)
    with BuildSketch(Plane(origin=(0, 57.18, 0), x_dir=(1, 0, 0), z_dir=(0, 1, 0)).offset(CORTE_EXTRUS_O1_START)):
        with BuildLine():
            Line((-1.510503721, 1.310869372), (-1.510503721, -1.310869372))
            ThreePointArc((-1.510503721, -1.310869372), (-2, 0), (-1.510503721, 1.310869372))
        make_face()
    extrude(amount=CORTE_EXTRUS_O1_DEPTH, mode=Mode.SUBTRACT)

    # Filete11
    filete11_edges = [part.edges().sort_by_distance(p)[0] for p in [
        (1.819579449, 57.18, -0.830138921),
        (-1.510503721, 57.18, 0),
    ]]
    fillet(filete11_edges, radius=FILETE11_R)


solid = part.part
